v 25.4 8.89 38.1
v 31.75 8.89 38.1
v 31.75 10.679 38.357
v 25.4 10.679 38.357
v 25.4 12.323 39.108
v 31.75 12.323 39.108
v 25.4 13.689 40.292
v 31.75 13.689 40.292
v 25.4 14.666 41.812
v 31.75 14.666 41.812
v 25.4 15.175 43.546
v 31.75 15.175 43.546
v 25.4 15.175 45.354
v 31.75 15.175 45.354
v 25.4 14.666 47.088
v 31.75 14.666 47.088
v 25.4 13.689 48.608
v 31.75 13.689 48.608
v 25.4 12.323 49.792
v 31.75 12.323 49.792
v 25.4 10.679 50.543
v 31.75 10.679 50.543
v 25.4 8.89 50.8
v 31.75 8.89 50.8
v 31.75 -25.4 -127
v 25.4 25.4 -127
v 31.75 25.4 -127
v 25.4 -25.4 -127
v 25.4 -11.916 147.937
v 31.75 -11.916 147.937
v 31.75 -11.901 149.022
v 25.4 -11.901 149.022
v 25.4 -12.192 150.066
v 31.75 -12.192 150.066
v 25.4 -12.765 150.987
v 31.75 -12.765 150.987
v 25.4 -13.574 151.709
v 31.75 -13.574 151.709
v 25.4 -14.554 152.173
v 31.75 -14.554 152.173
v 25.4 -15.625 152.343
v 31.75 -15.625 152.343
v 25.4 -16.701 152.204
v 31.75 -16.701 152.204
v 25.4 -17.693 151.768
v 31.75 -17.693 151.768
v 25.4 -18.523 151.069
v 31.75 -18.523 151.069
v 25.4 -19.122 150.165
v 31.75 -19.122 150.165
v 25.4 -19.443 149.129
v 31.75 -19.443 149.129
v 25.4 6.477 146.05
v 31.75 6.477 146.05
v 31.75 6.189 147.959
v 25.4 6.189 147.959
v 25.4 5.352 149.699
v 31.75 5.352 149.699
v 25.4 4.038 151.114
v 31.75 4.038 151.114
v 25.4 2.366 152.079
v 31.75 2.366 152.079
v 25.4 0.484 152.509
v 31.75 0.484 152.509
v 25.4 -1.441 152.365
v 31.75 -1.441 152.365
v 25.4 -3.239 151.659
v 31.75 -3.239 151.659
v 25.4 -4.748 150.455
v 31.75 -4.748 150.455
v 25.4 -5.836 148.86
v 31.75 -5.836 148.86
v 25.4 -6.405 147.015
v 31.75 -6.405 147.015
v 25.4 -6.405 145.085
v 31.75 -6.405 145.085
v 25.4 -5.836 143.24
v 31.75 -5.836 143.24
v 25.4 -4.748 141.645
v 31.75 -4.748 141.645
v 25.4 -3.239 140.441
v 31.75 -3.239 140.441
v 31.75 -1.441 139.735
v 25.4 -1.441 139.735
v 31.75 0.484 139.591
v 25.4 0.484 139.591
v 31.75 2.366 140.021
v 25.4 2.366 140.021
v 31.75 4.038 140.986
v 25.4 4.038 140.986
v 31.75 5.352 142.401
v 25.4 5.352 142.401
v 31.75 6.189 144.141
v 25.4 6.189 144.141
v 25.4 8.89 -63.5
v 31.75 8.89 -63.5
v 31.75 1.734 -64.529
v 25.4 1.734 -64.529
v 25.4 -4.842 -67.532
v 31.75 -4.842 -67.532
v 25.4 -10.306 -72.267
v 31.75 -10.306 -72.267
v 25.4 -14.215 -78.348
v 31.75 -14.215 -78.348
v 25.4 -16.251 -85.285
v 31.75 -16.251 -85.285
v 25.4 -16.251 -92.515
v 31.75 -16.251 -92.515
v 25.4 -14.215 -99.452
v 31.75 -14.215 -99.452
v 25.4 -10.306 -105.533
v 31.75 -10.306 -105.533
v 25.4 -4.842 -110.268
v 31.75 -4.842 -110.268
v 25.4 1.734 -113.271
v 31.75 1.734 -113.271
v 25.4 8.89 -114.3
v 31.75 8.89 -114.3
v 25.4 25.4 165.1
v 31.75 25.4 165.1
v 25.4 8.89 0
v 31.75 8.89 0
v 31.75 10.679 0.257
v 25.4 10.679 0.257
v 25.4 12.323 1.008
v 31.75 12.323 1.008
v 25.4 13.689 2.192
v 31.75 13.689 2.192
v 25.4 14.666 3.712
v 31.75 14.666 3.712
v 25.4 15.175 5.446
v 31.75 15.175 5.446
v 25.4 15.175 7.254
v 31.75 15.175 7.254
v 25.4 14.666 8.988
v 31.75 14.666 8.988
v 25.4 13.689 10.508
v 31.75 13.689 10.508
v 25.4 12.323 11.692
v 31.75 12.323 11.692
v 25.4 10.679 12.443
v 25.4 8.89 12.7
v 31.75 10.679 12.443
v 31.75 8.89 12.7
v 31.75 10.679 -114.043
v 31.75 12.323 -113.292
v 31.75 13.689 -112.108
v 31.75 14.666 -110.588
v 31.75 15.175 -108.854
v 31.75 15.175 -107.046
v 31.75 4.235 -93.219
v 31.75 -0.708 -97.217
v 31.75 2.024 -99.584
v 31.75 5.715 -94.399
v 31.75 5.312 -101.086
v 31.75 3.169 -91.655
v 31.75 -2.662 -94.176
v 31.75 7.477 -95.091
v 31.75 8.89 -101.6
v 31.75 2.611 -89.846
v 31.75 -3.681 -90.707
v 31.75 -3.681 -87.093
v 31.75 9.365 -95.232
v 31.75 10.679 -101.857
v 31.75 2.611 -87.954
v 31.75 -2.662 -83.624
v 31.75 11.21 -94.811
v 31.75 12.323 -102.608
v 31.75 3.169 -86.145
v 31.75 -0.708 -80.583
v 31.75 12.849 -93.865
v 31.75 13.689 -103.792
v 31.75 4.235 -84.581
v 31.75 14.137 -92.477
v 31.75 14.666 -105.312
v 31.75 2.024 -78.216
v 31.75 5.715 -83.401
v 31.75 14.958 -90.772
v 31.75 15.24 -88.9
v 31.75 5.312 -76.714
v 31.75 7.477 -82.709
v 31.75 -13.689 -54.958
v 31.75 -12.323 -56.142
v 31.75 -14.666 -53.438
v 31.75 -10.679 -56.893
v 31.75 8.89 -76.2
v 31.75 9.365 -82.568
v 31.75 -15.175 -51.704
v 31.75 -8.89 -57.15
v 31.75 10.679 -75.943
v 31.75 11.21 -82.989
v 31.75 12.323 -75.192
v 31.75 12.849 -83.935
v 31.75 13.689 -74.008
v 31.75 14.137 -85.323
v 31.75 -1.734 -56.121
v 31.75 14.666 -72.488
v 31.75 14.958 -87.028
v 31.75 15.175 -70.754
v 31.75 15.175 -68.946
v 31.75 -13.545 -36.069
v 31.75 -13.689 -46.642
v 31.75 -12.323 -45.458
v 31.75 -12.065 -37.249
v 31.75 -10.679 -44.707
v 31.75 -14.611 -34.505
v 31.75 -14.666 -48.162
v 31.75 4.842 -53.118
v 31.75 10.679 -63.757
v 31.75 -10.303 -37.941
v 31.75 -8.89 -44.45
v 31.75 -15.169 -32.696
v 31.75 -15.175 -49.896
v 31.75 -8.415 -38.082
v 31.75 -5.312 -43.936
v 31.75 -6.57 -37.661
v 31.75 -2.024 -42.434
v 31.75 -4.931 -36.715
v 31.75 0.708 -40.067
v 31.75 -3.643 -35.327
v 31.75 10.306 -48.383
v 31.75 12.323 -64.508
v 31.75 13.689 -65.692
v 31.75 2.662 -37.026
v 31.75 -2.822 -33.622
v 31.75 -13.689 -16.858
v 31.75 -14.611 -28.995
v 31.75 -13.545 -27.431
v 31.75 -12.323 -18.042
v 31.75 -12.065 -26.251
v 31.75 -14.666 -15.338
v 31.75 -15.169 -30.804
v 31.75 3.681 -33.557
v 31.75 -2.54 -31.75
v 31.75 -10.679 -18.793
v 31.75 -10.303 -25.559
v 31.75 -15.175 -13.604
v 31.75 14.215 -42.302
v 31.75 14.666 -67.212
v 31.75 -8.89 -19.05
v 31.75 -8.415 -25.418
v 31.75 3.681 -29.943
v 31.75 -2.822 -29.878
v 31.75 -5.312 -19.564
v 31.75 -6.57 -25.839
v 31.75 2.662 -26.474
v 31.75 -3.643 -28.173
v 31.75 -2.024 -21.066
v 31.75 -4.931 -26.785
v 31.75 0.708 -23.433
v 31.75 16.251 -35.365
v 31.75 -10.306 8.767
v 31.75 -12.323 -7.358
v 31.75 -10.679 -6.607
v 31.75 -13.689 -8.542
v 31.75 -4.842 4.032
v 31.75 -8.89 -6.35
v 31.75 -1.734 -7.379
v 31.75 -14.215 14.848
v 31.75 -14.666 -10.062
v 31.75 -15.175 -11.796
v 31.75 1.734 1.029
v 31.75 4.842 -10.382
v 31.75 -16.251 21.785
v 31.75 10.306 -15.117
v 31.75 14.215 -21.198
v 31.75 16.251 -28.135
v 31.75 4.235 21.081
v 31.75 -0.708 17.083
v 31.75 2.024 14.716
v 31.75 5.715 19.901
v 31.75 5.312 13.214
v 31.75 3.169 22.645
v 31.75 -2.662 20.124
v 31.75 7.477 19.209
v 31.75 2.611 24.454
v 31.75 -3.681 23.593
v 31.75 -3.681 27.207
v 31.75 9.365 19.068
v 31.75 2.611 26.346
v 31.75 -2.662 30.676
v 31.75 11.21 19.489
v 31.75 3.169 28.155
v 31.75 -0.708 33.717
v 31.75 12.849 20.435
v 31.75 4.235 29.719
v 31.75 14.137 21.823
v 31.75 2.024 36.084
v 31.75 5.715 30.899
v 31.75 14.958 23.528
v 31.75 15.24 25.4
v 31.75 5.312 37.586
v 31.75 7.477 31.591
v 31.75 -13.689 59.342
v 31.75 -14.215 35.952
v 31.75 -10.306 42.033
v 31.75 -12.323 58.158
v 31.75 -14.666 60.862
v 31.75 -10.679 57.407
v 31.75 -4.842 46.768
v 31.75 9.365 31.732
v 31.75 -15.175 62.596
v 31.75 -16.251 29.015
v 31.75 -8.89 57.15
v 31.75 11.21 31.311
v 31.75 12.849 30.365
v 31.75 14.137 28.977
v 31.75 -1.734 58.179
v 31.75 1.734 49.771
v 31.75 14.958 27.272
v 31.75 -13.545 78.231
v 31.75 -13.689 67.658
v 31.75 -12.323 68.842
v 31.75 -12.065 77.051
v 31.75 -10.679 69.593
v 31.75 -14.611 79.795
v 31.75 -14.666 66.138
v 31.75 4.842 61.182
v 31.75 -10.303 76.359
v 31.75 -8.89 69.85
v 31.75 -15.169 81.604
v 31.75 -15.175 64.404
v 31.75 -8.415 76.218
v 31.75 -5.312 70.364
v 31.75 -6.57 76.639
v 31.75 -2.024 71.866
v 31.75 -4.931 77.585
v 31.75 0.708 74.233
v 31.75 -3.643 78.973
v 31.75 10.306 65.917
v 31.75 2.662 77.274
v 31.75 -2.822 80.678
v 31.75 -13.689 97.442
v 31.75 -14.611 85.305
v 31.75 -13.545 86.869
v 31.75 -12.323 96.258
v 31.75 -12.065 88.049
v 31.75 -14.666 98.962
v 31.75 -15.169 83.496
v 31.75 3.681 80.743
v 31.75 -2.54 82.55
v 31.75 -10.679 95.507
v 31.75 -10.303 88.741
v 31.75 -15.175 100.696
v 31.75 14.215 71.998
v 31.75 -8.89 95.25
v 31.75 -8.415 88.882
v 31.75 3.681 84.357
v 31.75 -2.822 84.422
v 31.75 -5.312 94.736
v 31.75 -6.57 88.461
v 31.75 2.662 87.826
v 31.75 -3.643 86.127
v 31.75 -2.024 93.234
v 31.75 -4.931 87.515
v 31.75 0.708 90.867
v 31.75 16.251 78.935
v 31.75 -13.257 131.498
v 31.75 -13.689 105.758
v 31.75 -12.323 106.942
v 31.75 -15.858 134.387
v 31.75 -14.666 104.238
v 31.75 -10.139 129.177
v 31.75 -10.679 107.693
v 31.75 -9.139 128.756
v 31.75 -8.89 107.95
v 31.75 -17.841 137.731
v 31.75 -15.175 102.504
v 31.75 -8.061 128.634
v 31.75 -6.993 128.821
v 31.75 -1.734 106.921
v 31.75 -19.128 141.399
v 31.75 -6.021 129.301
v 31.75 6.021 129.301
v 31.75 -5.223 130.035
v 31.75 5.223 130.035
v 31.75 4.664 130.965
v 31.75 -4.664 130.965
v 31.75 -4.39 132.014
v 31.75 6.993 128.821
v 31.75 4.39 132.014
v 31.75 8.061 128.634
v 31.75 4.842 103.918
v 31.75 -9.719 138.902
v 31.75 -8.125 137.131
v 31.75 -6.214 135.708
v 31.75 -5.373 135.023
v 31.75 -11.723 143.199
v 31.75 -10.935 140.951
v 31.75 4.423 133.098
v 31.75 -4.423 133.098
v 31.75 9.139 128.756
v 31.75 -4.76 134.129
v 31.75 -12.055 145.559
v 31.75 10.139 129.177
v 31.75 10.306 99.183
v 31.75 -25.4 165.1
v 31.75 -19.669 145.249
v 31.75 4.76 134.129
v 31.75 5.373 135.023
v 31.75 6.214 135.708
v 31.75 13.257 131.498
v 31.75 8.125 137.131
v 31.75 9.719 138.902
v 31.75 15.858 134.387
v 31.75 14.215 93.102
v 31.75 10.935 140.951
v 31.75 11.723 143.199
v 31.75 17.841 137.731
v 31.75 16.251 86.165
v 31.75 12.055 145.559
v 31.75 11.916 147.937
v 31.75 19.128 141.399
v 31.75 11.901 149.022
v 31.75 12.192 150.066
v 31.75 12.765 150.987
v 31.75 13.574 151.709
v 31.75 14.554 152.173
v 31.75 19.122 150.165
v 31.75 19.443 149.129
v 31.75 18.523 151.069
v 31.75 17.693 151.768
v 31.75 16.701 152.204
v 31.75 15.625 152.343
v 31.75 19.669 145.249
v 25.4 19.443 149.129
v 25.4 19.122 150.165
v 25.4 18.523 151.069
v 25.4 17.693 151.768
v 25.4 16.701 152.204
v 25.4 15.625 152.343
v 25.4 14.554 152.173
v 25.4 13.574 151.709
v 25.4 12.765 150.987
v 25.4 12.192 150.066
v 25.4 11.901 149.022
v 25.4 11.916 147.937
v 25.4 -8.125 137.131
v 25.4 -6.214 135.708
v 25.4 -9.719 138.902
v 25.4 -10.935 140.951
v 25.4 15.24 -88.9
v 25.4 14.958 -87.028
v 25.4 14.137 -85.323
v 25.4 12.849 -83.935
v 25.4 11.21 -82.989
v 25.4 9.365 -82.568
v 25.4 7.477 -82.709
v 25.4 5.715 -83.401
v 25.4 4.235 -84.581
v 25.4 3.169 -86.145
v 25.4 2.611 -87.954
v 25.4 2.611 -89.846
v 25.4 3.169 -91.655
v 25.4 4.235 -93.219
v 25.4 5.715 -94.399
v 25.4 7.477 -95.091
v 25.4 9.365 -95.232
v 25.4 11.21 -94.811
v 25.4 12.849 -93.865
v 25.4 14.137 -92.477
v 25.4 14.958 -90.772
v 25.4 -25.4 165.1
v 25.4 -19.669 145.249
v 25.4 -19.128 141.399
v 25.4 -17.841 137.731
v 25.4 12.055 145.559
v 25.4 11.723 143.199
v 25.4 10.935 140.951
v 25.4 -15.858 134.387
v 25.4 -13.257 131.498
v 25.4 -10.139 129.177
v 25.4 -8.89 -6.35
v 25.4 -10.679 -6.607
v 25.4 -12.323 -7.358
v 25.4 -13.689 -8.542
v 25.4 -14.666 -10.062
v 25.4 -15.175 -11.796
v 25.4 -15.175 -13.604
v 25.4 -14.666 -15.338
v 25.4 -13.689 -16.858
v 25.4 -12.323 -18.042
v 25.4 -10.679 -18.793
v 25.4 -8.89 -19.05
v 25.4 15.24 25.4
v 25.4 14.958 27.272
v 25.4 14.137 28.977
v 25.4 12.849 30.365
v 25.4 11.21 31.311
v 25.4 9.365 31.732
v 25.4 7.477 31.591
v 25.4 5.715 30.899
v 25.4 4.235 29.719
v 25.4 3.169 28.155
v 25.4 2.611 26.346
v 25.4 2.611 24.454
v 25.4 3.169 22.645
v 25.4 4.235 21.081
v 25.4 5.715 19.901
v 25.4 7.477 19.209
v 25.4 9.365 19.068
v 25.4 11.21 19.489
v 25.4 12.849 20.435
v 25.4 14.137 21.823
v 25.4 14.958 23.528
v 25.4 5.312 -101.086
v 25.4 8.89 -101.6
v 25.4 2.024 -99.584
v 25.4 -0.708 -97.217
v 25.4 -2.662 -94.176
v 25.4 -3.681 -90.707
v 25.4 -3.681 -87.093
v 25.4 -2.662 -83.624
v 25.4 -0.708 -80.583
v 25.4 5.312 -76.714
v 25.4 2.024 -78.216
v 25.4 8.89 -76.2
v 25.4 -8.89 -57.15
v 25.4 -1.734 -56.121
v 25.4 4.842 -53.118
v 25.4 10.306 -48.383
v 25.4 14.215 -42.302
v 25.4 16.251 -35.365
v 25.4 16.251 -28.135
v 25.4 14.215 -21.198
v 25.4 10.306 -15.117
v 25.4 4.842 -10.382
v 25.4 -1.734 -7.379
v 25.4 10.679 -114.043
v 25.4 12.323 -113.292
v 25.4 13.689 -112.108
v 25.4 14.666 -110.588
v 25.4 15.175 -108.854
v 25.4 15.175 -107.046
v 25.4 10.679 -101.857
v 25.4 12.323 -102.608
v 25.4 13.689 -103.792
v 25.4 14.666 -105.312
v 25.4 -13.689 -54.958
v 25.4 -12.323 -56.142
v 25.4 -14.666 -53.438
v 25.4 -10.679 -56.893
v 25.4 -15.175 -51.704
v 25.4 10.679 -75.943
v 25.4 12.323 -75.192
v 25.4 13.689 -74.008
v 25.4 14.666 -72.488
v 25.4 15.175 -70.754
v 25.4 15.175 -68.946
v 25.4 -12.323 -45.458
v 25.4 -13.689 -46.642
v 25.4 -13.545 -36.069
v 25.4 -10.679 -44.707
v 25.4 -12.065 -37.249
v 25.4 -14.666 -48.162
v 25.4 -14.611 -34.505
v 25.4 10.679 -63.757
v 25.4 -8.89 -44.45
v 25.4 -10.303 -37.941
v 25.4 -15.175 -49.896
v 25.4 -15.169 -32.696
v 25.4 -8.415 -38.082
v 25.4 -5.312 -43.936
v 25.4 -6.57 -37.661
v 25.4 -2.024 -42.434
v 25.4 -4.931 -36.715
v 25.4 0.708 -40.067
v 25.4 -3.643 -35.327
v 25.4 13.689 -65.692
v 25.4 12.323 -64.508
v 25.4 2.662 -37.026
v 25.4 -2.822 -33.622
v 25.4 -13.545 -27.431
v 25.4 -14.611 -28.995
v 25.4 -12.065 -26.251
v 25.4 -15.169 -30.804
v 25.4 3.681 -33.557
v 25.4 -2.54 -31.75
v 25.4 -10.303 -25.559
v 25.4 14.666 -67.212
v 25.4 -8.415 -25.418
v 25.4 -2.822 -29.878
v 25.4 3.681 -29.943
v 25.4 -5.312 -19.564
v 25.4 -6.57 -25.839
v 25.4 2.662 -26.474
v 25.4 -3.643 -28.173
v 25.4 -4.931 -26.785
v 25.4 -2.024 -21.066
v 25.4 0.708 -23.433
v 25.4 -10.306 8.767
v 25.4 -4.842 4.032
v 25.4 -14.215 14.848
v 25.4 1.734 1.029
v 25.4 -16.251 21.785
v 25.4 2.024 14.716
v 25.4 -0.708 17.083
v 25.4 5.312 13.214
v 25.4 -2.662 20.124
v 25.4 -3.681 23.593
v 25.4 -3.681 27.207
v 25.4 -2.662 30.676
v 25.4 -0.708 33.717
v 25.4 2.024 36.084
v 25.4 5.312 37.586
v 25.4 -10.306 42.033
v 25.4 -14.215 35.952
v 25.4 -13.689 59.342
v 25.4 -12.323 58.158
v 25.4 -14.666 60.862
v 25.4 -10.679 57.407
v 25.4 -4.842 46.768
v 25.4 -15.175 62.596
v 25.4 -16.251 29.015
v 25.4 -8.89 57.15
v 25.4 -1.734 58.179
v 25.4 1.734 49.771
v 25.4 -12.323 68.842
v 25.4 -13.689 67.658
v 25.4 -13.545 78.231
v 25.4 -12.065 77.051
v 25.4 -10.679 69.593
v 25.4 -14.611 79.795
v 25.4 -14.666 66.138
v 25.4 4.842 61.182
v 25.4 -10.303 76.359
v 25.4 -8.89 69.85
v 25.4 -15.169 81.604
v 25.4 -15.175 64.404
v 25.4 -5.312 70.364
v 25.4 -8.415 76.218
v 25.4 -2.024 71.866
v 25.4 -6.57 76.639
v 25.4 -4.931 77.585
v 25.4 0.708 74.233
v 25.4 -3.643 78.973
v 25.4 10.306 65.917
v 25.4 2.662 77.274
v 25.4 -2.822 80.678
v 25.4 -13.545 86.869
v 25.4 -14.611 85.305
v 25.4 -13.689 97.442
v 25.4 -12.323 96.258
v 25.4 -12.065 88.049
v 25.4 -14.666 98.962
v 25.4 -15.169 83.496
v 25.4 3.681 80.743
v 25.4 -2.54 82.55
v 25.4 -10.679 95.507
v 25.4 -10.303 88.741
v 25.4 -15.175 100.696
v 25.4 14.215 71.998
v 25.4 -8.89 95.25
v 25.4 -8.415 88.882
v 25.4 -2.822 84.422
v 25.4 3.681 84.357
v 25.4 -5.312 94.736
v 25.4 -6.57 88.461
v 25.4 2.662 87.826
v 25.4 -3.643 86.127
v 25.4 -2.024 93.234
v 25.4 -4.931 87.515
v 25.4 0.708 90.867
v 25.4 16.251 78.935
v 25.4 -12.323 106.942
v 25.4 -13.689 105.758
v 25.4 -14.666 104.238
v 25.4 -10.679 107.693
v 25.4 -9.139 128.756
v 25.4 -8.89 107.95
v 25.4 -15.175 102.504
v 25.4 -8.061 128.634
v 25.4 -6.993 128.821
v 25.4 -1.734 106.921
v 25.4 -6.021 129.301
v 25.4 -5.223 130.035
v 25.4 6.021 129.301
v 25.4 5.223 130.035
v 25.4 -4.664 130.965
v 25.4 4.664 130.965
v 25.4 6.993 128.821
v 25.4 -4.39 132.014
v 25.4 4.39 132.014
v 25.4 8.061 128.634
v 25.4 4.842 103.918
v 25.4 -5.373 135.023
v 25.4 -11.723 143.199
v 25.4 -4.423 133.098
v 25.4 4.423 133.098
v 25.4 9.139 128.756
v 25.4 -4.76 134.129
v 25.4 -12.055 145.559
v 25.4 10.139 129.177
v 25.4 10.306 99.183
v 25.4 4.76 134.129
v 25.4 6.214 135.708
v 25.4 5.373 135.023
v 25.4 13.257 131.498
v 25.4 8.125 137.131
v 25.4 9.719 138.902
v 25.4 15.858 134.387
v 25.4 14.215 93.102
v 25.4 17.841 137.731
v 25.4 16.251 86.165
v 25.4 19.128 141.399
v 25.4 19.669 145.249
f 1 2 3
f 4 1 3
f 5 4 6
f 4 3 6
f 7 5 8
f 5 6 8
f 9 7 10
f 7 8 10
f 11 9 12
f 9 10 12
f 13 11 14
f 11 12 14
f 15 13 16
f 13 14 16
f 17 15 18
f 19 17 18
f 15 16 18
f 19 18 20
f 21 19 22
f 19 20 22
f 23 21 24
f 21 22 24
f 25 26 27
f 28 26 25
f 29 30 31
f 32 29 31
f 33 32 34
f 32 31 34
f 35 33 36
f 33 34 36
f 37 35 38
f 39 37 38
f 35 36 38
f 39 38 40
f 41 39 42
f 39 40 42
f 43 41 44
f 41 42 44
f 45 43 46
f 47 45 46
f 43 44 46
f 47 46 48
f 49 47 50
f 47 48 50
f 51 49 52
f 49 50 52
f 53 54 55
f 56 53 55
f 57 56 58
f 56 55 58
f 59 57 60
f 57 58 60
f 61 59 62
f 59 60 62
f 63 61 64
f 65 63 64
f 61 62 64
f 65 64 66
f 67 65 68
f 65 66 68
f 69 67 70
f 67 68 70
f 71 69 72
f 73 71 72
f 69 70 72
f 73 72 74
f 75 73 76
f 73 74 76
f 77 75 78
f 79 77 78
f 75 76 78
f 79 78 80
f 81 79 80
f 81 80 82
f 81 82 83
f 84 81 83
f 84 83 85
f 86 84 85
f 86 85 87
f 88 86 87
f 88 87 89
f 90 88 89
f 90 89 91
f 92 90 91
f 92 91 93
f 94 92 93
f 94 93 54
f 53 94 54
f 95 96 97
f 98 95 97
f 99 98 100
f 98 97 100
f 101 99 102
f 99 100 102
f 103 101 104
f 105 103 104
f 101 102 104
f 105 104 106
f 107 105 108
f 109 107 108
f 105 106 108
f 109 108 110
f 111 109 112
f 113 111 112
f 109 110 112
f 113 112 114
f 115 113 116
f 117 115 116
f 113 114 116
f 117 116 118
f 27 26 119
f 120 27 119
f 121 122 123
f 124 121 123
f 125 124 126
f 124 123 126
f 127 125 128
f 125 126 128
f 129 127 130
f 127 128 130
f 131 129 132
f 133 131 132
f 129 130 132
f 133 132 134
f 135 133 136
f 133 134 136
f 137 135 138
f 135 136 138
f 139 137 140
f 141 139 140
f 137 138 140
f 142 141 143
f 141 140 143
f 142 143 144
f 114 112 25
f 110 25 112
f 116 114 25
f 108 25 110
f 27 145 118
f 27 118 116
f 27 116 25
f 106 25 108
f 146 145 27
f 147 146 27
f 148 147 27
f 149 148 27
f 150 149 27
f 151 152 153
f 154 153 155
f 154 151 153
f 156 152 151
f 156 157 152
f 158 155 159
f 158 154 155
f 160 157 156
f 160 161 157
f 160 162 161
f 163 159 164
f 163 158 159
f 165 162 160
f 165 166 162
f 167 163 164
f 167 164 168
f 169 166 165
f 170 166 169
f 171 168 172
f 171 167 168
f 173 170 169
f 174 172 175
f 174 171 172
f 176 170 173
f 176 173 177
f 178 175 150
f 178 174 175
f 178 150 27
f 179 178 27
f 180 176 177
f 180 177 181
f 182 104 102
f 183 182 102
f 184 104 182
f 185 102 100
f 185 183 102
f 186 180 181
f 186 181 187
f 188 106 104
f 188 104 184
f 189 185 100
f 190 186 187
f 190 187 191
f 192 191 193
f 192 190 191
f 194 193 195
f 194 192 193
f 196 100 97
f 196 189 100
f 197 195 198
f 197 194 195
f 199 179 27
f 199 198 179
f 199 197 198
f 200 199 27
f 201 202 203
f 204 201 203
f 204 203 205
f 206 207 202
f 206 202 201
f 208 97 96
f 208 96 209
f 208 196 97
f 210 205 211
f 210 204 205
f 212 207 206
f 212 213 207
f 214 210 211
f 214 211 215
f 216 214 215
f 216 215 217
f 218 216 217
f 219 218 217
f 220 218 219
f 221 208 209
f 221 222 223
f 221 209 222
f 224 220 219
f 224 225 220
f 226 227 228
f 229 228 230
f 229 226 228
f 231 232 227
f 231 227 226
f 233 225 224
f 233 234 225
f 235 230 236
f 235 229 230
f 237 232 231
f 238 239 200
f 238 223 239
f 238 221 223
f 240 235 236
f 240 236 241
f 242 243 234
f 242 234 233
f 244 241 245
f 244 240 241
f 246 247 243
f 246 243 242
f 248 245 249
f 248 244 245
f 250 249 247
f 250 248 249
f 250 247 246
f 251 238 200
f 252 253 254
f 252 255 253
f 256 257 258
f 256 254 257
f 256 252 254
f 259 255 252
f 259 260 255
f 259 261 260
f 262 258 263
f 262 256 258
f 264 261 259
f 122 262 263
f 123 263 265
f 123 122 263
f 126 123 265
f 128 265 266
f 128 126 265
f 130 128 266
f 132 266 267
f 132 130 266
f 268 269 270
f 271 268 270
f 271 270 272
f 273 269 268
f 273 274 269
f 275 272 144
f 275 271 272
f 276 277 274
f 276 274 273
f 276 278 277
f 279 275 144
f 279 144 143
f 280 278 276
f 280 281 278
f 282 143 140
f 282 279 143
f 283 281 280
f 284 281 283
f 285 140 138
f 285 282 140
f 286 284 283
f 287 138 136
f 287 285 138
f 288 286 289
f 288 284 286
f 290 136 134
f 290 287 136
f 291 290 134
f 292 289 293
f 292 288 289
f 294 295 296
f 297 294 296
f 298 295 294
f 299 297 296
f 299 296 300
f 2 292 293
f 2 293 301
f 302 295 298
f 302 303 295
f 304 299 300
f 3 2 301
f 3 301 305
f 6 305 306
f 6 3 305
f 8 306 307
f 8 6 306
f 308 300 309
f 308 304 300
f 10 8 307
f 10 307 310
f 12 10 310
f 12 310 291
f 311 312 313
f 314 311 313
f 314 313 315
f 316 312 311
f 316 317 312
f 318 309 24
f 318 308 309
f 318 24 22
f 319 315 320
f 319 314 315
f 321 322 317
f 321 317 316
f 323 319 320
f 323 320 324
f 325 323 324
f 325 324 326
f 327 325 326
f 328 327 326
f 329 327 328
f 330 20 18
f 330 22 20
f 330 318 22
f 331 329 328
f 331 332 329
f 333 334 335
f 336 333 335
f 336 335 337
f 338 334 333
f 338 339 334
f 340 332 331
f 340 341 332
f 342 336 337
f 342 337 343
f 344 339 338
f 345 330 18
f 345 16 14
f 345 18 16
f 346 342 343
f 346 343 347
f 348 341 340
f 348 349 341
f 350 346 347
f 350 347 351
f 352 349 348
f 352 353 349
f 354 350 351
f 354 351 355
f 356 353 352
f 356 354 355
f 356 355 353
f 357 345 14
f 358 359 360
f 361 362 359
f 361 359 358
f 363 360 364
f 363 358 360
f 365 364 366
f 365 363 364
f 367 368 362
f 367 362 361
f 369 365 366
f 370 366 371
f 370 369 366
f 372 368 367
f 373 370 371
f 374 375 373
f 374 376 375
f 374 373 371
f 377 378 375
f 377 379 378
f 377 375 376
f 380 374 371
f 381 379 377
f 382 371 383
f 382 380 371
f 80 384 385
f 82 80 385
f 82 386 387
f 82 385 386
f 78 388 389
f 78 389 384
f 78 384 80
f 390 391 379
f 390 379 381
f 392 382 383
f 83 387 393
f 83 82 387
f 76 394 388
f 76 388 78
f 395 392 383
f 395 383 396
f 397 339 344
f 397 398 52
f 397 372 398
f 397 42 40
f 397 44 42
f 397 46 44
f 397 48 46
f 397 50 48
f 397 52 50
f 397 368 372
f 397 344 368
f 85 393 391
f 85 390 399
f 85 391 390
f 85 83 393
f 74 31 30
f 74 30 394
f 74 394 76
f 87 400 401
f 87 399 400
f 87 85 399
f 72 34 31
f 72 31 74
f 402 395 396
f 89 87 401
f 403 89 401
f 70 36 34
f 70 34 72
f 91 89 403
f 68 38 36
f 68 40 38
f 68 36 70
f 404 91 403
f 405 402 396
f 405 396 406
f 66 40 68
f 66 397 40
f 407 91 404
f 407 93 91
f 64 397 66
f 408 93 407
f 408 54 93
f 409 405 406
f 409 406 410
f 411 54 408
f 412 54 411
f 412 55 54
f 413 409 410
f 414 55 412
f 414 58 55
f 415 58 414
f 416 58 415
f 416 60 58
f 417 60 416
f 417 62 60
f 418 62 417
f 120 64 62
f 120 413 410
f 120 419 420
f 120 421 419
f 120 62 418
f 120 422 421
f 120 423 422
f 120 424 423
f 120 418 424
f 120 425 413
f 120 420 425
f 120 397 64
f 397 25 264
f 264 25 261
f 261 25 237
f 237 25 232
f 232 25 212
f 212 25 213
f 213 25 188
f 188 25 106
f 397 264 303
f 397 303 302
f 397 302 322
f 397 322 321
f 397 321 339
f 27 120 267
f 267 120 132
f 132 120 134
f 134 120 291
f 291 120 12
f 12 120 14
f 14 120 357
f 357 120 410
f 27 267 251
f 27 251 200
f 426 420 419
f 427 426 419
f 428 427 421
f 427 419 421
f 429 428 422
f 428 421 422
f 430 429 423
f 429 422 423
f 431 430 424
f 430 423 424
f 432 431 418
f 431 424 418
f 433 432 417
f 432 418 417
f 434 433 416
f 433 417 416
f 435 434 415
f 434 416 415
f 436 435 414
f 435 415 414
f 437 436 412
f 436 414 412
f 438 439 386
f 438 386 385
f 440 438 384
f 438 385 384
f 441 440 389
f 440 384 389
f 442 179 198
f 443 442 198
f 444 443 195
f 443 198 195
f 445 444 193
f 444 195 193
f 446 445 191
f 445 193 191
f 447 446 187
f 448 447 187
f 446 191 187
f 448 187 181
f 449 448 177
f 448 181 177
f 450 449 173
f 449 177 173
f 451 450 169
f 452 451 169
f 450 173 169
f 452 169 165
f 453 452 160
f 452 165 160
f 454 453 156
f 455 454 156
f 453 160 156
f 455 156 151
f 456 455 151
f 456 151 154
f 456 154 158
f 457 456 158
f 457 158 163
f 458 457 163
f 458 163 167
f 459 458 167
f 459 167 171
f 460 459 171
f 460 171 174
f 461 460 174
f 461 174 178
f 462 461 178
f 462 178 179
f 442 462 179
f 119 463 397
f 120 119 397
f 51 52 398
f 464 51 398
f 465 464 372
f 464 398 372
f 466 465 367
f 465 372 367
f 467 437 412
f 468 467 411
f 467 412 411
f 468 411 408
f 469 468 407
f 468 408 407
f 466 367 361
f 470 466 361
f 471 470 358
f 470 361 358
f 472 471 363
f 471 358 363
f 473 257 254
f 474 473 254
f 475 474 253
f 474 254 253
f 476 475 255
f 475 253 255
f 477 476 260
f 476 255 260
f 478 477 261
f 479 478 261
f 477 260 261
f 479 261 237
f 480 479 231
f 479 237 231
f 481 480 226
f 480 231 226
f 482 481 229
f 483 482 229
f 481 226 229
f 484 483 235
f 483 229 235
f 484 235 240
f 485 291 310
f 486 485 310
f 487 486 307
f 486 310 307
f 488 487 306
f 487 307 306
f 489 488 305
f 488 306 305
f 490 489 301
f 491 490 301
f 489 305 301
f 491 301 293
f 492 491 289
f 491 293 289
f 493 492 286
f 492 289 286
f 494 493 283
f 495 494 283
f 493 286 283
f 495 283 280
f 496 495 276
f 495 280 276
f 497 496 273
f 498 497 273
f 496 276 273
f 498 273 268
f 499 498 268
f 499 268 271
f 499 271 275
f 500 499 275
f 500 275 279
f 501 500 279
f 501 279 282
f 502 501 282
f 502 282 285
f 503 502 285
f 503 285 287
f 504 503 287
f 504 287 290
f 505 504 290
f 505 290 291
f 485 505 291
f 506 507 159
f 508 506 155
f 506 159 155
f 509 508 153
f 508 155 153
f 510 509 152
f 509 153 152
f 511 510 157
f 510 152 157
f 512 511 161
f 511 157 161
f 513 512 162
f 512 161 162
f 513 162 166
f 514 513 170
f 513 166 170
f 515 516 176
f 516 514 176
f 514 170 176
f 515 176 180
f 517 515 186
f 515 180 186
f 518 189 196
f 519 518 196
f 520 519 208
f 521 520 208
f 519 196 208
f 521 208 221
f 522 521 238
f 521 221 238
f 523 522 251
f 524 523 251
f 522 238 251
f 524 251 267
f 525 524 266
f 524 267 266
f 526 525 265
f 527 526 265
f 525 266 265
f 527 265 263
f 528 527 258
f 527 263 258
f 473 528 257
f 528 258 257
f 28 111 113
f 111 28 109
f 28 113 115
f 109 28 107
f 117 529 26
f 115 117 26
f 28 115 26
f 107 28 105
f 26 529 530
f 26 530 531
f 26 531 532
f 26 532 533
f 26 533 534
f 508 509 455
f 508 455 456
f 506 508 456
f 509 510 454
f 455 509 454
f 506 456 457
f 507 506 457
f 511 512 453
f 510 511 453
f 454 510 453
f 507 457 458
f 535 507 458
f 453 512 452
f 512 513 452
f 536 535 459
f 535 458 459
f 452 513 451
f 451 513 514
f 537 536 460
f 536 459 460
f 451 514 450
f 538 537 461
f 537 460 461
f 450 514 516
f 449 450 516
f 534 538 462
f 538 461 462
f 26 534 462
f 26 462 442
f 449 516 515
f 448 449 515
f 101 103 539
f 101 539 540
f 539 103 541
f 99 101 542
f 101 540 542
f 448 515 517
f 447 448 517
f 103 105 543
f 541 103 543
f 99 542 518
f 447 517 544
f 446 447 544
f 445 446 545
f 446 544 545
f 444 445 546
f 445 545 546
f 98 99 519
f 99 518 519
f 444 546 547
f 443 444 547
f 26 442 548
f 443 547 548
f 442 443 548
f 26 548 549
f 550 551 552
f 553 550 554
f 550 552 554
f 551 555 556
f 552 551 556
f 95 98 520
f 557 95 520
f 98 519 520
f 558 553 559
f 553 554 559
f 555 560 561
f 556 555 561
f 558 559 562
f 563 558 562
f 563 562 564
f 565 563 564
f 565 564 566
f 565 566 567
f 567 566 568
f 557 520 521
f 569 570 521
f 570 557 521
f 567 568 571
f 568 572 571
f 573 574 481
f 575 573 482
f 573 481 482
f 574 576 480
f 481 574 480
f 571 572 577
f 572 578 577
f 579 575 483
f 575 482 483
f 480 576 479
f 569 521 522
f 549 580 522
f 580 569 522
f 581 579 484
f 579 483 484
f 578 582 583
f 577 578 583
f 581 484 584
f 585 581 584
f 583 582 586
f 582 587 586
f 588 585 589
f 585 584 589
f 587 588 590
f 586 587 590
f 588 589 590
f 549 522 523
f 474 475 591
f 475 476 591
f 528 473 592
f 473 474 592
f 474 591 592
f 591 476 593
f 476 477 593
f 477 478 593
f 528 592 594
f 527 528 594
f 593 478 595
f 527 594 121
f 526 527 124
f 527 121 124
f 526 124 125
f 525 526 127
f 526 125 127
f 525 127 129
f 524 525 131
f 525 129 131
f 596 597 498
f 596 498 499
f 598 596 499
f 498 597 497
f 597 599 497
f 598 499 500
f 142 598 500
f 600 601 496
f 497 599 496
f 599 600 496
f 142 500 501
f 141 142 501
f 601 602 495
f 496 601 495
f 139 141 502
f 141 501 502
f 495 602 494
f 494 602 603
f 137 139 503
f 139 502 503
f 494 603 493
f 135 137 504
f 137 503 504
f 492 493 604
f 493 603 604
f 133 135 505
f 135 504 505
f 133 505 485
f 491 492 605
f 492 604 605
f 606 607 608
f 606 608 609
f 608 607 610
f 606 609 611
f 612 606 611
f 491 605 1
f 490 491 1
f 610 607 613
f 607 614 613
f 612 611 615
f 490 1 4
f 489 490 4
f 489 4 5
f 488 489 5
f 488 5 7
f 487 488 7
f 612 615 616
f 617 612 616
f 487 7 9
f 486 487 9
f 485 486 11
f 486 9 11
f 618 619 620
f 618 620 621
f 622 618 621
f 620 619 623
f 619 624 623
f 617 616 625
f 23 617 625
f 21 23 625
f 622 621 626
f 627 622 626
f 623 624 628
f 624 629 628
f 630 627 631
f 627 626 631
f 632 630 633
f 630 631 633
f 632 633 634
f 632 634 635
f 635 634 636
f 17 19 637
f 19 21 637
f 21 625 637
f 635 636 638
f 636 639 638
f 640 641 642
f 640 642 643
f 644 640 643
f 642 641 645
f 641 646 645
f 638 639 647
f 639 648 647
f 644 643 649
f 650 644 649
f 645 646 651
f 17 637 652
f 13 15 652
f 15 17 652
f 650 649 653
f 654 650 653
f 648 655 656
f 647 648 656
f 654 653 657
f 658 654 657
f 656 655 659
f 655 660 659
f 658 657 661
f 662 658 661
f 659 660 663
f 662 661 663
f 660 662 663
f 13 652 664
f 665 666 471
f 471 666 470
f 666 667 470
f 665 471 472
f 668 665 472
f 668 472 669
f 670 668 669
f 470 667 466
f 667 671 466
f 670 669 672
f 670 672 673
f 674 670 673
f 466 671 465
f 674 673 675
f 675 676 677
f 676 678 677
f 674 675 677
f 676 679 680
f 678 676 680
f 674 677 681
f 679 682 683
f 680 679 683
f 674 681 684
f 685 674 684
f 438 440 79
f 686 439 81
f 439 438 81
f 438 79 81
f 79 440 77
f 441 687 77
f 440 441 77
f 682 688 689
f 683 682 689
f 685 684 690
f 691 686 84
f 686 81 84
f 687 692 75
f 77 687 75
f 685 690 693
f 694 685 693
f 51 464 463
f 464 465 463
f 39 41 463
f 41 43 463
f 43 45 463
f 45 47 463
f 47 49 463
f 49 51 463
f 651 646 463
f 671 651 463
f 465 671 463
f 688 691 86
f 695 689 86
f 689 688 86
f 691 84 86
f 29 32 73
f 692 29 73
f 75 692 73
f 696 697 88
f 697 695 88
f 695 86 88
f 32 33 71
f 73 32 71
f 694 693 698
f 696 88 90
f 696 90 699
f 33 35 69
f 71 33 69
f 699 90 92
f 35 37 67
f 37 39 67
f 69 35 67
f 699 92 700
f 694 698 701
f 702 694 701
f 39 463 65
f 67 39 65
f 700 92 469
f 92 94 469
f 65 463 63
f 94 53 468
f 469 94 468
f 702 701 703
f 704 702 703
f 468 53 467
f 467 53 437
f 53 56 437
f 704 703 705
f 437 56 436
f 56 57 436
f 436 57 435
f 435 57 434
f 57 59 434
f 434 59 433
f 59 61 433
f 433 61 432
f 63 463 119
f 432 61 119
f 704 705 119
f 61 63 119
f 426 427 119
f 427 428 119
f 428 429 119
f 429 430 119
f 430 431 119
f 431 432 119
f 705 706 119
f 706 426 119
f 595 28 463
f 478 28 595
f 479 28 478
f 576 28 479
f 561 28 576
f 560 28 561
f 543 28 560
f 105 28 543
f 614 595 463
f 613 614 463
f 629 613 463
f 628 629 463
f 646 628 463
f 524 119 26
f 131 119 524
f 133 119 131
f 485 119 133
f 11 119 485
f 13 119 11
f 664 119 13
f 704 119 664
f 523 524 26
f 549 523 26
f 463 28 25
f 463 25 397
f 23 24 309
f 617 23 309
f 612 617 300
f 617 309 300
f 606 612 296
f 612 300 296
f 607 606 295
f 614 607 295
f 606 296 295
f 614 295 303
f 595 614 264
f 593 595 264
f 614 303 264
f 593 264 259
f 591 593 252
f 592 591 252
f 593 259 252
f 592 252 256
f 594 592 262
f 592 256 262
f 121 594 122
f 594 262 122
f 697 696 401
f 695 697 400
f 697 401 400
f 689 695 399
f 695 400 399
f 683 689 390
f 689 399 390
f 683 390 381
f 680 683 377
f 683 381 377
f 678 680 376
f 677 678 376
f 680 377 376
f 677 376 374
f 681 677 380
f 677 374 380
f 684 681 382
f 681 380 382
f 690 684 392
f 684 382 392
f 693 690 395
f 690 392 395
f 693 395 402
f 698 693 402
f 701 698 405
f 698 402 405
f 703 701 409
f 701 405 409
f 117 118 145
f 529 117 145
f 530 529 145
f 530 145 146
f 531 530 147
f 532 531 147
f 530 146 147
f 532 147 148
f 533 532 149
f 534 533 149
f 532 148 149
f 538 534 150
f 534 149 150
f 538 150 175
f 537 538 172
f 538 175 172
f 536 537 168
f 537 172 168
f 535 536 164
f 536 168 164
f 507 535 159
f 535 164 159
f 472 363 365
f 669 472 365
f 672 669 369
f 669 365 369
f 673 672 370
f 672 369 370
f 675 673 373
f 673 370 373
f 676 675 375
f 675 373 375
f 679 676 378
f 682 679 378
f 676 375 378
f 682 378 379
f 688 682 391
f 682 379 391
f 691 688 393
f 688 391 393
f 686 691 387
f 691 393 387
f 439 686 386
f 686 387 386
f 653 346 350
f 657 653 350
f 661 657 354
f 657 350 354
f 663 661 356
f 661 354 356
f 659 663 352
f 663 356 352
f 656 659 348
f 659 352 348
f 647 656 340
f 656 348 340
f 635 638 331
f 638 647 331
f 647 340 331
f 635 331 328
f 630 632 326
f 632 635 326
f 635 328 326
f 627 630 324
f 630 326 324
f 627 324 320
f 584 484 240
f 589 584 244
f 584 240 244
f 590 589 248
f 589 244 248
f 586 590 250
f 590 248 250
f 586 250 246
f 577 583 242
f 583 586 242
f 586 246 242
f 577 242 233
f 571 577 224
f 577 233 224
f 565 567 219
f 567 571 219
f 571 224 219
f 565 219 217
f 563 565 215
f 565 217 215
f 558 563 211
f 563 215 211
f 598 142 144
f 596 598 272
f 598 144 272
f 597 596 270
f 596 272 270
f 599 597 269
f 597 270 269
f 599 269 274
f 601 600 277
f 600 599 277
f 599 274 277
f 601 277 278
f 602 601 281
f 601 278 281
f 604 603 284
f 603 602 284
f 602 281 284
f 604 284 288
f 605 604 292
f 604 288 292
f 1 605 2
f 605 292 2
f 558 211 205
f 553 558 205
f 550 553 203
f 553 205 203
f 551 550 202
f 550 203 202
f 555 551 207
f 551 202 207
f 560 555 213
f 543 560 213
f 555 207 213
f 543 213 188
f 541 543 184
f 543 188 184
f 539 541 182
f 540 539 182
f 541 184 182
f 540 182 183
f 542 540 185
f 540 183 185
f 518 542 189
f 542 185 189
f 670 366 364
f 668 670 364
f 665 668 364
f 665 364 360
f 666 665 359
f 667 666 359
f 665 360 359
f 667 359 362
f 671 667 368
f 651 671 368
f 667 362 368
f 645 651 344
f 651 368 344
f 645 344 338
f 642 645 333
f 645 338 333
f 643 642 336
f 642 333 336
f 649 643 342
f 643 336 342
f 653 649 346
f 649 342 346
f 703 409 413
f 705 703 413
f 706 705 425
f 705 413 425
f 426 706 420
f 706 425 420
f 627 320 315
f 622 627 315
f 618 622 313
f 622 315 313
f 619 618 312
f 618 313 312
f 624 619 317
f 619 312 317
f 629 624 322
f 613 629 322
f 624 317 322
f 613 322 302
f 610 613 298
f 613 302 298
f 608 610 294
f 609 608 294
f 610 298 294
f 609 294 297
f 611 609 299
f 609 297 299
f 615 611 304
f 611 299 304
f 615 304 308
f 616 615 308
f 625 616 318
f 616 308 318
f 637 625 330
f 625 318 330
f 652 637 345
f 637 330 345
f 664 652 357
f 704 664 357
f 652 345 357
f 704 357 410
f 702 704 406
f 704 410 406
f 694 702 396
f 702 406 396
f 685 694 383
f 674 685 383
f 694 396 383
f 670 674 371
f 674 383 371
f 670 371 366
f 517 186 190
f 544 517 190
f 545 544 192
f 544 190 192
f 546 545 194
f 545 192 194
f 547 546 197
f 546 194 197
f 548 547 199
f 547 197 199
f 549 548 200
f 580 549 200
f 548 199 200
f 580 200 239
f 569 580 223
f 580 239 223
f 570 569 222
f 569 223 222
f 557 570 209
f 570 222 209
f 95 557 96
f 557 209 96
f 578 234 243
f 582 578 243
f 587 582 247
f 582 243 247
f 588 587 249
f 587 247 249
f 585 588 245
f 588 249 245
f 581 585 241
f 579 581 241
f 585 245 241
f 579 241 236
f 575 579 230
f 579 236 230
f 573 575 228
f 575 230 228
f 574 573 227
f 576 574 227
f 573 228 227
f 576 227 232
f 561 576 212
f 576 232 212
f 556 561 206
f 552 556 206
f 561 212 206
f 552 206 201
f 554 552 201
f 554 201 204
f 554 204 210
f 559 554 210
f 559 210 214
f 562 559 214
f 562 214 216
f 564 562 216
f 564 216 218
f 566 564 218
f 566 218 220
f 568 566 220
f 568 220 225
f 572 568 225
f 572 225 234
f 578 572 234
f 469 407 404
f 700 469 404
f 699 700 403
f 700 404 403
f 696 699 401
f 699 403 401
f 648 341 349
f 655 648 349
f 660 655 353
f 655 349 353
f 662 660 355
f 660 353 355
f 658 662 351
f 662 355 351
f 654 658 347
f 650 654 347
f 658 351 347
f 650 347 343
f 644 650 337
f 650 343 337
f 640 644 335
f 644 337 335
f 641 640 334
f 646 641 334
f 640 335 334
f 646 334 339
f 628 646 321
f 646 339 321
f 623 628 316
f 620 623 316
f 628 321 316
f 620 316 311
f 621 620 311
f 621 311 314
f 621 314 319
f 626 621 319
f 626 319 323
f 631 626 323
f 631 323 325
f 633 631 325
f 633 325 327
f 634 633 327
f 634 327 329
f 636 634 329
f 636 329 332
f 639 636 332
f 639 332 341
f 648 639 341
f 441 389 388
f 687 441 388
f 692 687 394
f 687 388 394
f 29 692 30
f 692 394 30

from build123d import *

# Parameters (mm, degrees)
F0_W      = 63.5
F0_H      = 63.5
F0_W_2    = 50.8
F0_H_2    = 50.8
F1_DEPTH  = 165.1
F3_R      = 6.477
F4_DEPTH  = 25.4
F6_DEPTH  = 25.4
F7_R      = 6.35
F8_DEPTH  = 63.501
F9_W      = 93.0855199695
F9_H      = 380.0157606602
F9_W_2    = 50.8
F9_H_2    = 292.1
F10_DEPTH = 38.1
F11_W     = 93.9574092627
F11_H     = 381.9095790386
F12_DEPTH = 91.44


# Not quite as in the source:
# - ends of sketch curves that miss each other by under 0.0002 mm in the source are joined


with BuildPart() as f1:
    # F0 (on Top) → F1 (new body, symmetric)
    with BuildSketch(Plane.XY):
        Rectangle(F0_W, F0_H)
        Rectangle(F0_W_2, F0_H_2, mode=Mode.SUBTRACT)
    extrude(amount=F1_DEPTH, both=True)

    # F3 (on face) → F4 (cut)
    with BuildSketch(Plane.YZ.offset(31.75)):
        with Locations((0, 146.05)):
            Circle(F3_R)
        with BuildLine():
            ThreePointArc((10.1385245046, 129.1766616857), (14.6288058895, 132.8781640138), (17.8406687878, 137.7307595176))
            ThreePointArc((17.8406687878, 137.7307595176), (19.4934269332, 143.3103775076), (19.4426449846, 149.1294124443))
            ThreePointArc((19.4426449846, 149.1294124443), (15.0835370951, 152.2964897102), (11.9164598293, 147.9373818207))
            ThreePointArc((11.9164598293, 147.9373818207), (11.9475842494, 144.3708765369), (10.9346034506, 140.9511106721))
            ThreePointArc((10.9346034506, 140.9511106721), (8.9660423194, 137.9769392343), (6.2139343738, 135.708276517))
            ThreePointArc((6.2139343738, 135.708276517), (4.9104220235, 130.4801740359), (10.1385245046, 129.1766616857))
        make_face()
        with BuildLine():
            ThreePointArc((-10.1385245046, 129.1766616857), (-4.9104220235, 130.4801740359), (-6.2139343738, 135.708276517))
            ThreePointArc((-6.2139343738, 135.708276517), (-8.9660423194, 137.9769392343), (-10.9346034506, 140.9511106721))
            ThreePointArc((-10.9346034506, 140.9511106721), (-11.9475842494, 144.3708765369), (-11.9164598293, 147.9373818207))
            ThreePointArc((-11.9164598293, 147.9373818207), (-15.0835370951, 152.2964897102), (-19.4426449846, 149.1294124443))
            ThreePointArc((-19.4426449846, 149.1294124443), (-19.4934269332, 143.3103775076), (-17.8406687878, 137.7307595176))
            ThreePointArc((-17.8406687878, 137.7307595176), (-14.6288058895, 132.8781640138), (-10.1385245046, 129.1766616857))
        make_face()
    extrude(amount=-F4_DEPTH, mode=Mode.SUBTRACT)

    # F5 (on face) → F6 (cut)
    with BuildSketch(Plane(origin=(-31.75, 0, 0), x_dir=(0, -1, 0), z_dir=(-1, 0, 0))):
        with BuildLine():
            ThreePointArc((-3.1401119103, 140.3850881569), (3.2873259769, 140.4692279278), (6.477, 146.05))
            ThreePointArc((6.477, 146.05), (-3.2873259769, 151.6307720722), (-3.1401119103, 140.3850881569))
        make_face()
        with BuildLine():
            ThreePointArc((-5.7913527214, 132.1654121492), (-6.0549491708, 133.1322727306), (-6.7727903948, 133.8315626913))
            ThreePointArc((-6.7727903948, 133.8315626913), (-9.3377562721, 131.1985515677), (-5.7913527214, 132.1654121492))
        make_face()
        with BuildLine():
            ThreePointArc((3.1226517792, 134.3961049058), (0.4285749428, 129.7298269458), (5.0948529028, 127.0357501095))
            ThreePointArc((5.0948529028, 127.0357501095), (17.8406687878, 137.7307595176), (17.8406687878, 154.3692404824))
            ThreePointArc((17.8406687878, 154.3692404824), (12.777460542, 156.2120975737), (10.9346034506, 151.1488893279))
            ThreePointArc((10.9346034506, 151.1488893279), (10.9346034506, 140.9511106721), (3.1226517792, 134.3961049058))
        make_face()
    extrude(amount=-F6_DEPTH, mode=Mode.SUBTRACT)

    # F7 (on face) → F8 (cut, through all)
    with BuildSketch(Plane.YZ.offset(31.75)):
        with BuildLine():
            ThreePointArc((-8.89, 107.949999693), (-15.239999693, 101.6), (-8.89, 95.250000307))
            ThreePointArc((-8.89, 95.250000307), (3.81, 82.55), (-8.89, 69.85))
            ThreePointArc((-8.89, 69.85), (-15.239999693, 63.5), (-8.89, 57.150000307))
            ThreePointArc((-8.89, 57.150000307), (16.509999693, 82.55), (-8.89, 107.949999693))
        make_face()
        with BuildLine():
            ThreePointArc((8.89, 3.07e-07), (15.239999693, 6.35), (8.89, 12.699999693))
            ThreePointArc((8.89, 12.699999693), (-3.81, 25.4), (8.89, 38.1))
            ThreePointArc((8.89, 38.1), (15.24, 44.45), (8.89, 50.8))
            ThreePointArc((8.89, 50.8), (-16.509999693, 25.4), (8.89, 3.07e-07))
        make_face()
        with BuildLine():
            ThreePointArc((-8.89, -6.350000307), (-15.239999693, -12.7), (-8.89, -19.049999693))
            ThreePointArc((-8.89, -19.049999693), (3.81, -31.75), (-8.89, -44.45))
            ThreePointArc((-8.89, -44.45), (-15.239999693, -50.8), (-8.89, -57.149999693))
            ThreePointArc((-8.89, -57.149999693), (16.509999693, -31.75), (-8.89, -6.350000307))
        make_face()
        with BuildLine():
            ThreePointArc((8.89, -114.299999693), (15.239999693, -107.95), (8.89, -101.600000307))
            ThreePointArc((8.89, -101.600000307), (-3.81, -88.9), (8.89, -76.2))
            ThreePointArc((8.89, -76.2), (15.24, -69.85), (8.89, -63.5))
            ThreePointArc((8.89, -63.5), (-16.509999693, -88.9), (8.89, -114.299999693))
        make_face()
        with Locations((-8.89, 82.55)):
            Circle(F7_R)
        with Locations((8.89, 25.4)):
            Circle(F7_R)
        with Locations((8.89, -88.9)):
            Circle(F7_R)
        with Locations((-8.89, -31.75)):
            Circle(F7_R)
    extrude(amount=-F8_DEPTH, mode=Mode.SUBTRACT)

    # F9 (on face) → F10 (cut, symmetric)
    with BuildSketch(Plane(origin=(25.4, 0, 0), x_dir=(0, -1, 0), z_dir=(-1, 0, 0))):
        Rectangle(F9_W, F9_H)
        with Locations((0, 19.05)):
            Rectangle(F9_W_2, F9_H_2, mode=Mode.SUBTRACT)
    extrude(amount=F10_DEPTH, both=True, mode=Mode.SUBTRACT)

    # F11 (on face) → F12 (cut)
    with BuildSketch(Plane(origin=(25.4, 0, 0), x_dir=(0, -1, 0), z_dir=(-1, 0, 0))):
        Rectangle(F11_W, F11_H)
    extrude(amount=F12_DEPTH, mode=Mode.SUBTRACT)


solid = f1.part
